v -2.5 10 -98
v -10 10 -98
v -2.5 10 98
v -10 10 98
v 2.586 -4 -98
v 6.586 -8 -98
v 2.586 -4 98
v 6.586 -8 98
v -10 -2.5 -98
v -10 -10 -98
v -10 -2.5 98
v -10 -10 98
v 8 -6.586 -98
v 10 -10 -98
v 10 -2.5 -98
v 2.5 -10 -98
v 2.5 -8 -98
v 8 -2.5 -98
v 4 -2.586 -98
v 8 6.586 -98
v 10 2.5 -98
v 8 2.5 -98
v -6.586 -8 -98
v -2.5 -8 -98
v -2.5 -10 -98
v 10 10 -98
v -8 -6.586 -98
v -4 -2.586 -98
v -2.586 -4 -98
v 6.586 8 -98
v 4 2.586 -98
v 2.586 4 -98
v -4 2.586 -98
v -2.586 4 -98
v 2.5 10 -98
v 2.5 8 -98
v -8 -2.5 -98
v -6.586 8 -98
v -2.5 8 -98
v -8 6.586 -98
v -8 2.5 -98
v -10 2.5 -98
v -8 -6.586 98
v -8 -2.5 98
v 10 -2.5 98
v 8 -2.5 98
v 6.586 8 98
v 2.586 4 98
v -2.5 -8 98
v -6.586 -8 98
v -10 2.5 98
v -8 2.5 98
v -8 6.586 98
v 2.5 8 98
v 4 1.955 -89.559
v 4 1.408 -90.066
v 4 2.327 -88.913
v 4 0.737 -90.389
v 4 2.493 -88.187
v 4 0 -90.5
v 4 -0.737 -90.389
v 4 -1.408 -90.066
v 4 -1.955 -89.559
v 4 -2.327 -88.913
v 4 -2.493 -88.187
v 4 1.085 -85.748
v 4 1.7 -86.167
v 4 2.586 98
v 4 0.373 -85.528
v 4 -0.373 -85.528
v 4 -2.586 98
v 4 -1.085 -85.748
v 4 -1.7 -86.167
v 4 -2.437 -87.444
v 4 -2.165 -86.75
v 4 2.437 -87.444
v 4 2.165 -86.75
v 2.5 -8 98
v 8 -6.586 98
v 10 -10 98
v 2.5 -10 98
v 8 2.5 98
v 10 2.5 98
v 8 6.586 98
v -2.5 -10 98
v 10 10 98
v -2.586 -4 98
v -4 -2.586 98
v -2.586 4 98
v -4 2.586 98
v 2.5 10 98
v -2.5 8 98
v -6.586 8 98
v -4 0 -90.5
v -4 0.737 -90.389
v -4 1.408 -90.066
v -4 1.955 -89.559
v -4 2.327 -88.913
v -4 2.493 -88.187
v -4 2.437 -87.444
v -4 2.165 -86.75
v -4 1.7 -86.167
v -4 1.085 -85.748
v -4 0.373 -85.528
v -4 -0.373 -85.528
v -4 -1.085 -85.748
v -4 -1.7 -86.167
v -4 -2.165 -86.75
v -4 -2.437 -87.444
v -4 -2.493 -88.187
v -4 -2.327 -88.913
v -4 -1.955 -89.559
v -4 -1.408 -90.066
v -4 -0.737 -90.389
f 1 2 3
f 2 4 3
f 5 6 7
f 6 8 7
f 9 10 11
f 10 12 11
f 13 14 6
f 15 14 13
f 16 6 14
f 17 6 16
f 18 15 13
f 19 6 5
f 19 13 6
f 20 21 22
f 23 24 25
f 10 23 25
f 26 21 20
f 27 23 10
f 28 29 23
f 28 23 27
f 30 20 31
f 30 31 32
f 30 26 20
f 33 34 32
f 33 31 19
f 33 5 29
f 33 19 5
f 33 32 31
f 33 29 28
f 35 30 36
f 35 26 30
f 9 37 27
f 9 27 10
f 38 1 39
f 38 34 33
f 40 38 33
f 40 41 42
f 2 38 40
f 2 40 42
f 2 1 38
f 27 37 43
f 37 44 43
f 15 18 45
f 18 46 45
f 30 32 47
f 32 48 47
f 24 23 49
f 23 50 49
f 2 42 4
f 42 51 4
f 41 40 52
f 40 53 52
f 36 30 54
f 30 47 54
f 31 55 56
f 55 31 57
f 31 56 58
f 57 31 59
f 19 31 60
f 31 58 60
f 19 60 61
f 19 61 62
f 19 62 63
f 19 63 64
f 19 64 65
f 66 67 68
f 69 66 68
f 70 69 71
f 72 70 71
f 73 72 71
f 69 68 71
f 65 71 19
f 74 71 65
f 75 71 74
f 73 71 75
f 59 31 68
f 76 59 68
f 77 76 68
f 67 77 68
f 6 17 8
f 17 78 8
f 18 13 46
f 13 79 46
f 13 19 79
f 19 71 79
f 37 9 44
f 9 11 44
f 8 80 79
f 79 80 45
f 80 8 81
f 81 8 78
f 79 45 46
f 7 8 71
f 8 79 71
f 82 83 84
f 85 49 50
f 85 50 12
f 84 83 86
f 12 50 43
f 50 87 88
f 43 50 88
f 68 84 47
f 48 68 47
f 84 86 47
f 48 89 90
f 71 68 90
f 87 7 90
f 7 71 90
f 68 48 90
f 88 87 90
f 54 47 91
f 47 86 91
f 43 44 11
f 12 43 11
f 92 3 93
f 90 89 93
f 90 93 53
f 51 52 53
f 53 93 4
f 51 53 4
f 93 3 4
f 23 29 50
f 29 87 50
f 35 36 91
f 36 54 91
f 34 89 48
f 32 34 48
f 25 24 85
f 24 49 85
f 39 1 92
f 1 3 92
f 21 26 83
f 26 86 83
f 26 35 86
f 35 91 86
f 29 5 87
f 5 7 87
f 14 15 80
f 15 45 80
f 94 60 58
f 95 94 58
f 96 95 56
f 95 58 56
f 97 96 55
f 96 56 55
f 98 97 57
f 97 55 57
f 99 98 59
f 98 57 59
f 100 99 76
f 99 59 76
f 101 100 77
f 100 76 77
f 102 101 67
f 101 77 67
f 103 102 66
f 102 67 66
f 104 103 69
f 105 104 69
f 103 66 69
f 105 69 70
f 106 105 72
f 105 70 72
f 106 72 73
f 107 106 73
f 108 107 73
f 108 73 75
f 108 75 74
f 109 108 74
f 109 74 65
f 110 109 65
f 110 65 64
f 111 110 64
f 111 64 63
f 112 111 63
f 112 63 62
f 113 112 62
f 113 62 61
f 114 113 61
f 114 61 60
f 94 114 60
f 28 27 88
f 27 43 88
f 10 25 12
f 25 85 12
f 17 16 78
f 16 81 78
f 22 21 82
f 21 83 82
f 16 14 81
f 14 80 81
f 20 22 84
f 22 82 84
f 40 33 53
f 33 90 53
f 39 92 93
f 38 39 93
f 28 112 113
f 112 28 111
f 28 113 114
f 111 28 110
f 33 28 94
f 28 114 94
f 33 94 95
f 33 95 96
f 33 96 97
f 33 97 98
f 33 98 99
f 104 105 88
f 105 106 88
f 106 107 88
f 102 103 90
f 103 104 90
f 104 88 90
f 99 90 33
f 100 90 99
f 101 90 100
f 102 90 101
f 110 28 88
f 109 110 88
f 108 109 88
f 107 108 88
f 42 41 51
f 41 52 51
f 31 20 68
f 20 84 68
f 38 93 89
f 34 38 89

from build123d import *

# Parameters (mm, degrees)
BOSS_EXTRUDE1_DEPTH = 98
SKETCH2_R           = 2.5
CUT_EXTRUDE1_DEPTH  = 10


with BuildPart() as part:
    # Sketch1 → Boss-Extrude1 (new body, symmetric)
    with BuildSketch(Plane.XY):
        Polygon((-2.585786438, 4), (2.585786438, 4), (6.585786438, 8), (2.5, 8), (2.5, 10), (10, 10), (10, 2.5), (8, 2.5), (8, 6.585786438), (4, 2.585786438), (4, -2.585786438), (8, -6.585786438), (8, -2.5), (10, -2.5), (10, -10), (2.5, -10), (2.5, -8), (6.585786438, -8), (2.585786438, -4), (-2.585786438, -4), (-6.585786438, -8), (-2.5, -8), (-2.5, -10), (-10, -10), (-10, -2.5), (-8, -2.5), (-8, -6.585786438), (-4, -2.585786438), (-4, 2.585786438), (-8, 6.585786438), (-8, 2.5), (-10, 2.5), (-10, 10), (-2.5, 10), (-2.5, 8), (-6.585786438, 8), align=None)
    extrude(amount=BOSS_EXTRUDE1_DEPTH, both=True)

    # Sketch2 → Cut-Extrude1 (cut)
    with BuildSketch(Plane(origin=(4, 0, 0), x_dir=(0, 0, -1), z_dir=(1, 0, 0))):
        with Locations((88, 0)):
            Circle(SKETCH2_R)
    extrude(amount=-CUT_EXTRUDE1_DEPTH, mode=Mode.SUBTRACT)


solid = part.part
